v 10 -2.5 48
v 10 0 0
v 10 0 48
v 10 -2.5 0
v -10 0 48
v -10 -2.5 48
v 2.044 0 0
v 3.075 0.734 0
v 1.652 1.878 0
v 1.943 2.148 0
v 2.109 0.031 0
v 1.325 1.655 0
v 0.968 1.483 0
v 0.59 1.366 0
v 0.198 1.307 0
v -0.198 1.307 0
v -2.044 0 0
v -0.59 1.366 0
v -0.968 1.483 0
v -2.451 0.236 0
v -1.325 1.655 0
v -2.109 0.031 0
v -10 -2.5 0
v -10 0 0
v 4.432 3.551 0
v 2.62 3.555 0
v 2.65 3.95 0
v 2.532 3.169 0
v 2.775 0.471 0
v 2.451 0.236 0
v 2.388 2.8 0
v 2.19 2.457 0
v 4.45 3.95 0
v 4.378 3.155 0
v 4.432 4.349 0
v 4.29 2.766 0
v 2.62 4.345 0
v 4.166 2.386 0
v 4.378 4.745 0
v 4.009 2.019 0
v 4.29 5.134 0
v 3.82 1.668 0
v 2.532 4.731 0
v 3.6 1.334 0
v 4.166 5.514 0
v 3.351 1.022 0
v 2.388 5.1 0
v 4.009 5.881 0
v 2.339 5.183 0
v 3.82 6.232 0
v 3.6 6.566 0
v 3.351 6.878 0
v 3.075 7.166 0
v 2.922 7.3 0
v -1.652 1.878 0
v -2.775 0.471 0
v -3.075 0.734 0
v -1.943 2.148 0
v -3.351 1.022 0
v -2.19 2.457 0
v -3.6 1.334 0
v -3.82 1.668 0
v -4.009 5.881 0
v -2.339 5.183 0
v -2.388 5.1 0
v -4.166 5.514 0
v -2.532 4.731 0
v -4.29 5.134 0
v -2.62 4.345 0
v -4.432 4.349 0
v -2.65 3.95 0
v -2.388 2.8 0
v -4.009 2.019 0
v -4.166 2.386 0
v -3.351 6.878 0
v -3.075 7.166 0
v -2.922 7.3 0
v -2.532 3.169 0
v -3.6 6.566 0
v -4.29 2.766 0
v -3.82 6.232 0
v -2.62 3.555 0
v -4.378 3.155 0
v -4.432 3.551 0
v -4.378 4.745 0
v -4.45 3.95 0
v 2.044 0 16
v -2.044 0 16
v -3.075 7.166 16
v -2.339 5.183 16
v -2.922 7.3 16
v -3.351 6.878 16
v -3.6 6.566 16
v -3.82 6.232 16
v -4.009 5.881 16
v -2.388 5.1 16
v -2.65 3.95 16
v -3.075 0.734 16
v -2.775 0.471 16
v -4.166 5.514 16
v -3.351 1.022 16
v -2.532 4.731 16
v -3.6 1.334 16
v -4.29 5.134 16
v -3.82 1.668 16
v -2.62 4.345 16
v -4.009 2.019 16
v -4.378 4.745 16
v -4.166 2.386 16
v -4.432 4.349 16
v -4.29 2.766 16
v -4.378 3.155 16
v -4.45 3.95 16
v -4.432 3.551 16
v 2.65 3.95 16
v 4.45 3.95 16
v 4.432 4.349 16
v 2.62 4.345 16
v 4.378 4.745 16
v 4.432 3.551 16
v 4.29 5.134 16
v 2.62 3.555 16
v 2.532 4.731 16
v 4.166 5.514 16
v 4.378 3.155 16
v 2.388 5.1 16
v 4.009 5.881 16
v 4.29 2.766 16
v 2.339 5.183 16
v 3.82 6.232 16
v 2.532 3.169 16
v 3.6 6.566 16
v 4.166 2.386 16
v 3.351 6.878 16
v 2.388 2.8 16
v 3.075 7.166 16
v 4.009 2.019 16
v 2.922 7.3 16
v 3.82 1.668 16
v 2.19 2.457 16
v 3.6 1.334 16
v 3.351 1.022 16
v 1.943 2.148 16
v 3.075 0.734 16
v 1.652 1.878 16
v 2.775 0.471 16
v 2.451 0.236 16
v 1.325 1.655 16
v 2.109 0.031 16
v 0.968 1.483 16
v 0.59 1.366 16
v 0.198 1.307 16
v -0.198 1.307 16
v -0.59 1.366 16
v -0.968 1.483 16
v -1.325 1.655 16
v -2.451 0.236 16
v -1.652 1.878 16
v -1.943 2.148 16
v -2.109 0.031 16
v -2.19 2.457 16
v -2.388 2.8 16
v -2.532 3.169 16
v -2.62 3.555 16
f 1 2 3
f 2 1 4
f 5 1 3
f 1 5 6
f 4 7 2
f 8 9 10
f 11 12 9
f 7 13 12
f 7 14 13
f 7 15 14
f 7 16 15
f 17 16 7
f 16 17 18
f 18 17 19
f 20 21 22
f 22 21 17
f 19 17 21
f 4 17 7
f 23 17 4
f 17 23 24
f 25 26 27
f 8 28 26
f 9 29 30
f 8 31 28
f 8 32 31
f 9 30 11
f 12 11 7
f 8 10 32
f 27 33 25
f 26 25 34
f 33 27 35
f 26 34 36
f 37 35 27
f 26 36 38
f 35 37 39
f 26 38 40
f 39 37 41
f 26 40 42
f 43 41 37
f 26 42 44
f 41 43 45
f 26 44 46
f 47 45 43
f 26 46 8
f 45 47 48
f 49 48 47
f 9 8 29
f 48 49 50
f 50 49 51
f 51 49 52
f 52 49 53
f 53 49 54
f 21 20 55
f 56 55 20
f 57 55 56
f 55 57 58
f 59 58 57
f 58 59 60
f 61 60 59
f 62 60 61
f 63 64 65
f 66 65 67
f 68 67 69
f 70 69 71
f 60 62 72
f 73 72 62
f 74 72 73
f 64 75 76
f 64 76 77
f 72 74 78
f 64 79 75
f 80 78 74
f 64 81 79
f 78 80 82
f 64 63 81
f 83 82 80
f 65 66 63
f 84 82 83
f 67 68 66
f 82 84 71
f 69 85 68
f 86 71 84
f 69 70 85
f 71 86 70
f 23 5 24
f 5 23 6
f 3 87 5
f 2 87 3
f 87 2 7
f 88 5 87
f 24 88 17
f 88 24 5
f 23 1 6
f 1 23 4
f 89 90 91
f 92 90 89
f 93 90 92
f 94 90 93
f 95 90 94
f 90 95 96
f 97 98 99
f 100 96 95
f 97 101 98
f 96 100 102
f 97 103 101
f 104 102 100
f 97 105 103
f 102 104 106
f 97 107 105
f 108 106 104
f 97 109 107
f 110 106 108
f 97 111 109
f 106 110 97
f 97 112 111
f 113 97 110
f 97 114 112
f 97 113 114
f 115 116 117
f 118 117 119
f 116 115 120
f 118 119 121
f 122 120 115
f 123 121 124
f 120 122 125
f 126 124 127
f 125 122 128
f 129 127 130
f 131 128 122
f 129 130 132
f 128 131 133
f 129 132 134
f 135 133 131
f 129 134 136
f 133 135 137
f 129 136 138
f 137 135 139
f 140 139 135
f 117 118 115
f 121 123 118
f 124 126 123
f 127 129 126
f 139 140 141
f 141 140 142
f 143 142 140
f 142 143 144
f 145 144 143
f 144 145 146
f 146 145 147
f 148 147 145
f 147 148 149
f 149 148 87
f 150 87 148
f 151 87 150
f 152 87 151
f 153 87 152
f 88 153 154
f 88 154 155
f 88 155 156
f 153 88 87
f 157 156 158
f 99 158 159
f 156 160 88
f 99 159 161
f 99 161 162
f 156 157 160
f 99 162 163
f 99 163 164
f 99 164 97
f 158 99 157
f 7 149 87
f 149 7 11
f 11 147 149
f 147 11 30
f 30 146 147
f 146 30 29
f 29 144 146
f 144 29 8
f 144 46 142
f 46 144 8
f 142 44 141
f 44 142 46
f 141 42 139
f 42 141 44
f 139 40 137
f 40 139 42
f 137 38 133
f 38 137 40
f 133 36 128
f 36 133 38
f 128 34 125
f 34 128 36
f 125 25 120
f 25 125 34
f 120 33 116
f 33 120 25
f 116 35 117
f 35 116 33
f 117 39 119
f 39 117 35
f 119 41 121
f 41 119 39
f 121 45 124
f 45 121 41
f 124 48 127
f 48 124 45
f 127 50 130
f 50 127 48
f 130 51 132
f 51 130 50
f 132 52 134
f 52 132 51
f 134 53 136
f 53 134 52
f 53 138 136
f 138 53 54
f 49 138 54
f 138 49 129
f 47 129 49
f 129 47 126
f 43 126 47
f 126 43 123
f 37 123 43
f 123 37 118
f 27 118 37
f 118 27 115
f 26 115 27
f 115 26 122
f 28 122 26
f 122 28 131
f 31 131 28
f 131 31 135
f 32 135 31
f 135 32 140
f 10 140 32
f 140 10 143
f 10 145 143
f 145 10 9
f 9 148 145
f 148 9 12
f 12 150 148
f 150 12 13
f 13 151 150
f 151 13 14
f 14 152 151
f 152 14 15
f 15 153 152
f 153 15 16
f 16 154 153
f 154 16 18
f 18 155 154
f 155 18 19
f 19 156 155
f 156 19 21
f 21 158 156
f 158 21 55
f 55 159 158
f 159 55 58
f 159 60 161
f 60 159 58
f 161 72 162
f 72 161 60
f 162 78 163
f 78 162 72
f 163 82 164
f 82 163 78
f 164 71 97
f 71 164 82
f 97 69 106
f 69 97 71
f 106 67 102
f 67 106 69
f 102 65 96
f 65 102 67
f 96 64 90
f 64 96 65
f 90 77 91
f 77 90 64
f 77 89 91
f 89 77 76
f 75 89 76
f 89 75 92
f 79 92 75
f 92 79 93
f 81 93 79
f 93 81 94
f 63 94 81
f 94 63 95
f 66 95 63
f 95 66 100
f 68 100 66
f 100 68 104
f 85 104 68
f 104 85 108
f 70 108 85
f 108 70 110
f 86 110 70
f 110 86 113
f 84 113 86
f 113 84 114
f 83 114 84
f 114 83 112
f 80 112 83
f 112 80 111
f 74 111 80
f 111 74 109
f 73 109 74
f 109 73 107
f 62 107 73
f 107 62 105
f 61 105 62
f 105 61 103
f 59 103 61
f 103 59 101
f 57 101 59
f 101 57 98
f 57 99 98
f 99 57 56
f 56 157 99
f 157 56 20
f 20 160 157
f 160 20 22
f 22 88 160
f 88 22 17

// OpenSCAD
/* =====================================================
   Coax cable clip
   =====================================================
   A snap-in clip for the coax hanging off the ClearStream
   Flex antenna. Stick it to the wall a few inches below the
   antenna, so the cable's weight hangs on the clip and doesn't
   peel the antenna's bottom edge off the wall.

   Cable (measured): Ø5

   The clip opens away from the wall with a flared mouth a bit
   narrower than the cable. Push the cable in and the ring
   flexes and snaps round it. The plate takes a small Command
   strip (16 x 46).

   Print it standing on end, with the ring's cross-section on
   the bed. The whole part is a straight extrusion, so there's
   nothing to overhang.

   Coordinates: X across (centred), Y out from the wall (plate
   front face at Y = 0), Z along the cable.
   ===================================================== */

$fa = 2;
$fs = 0.4;

/* ── Cable (measured) ───────────────────────────────── */
cable_d = 5;

/* ── Clip ───────────────────────────────────────────── */
clear   = 0.15;  // per side inside the ring
ring_t  = 1.8;   // ring wall
mouth   = 4.0;   // opening, narrower than the cable so it snaps
flare   = 1.5;   // lead-in each side at the outer edge
clip_l  = 16;    // ring length along the cable
plate_w = 20;
plate_l = 48;    // fits a small Command strip
plate_t = 2.5;

/* ── Derived ────────────────────────────────────────── */
ri = cable_d / 2 + clear;
ro = ri + ring_t;
cy = ro - 0.5;   // ring centre; the ring sinks 0.5 into the plate

assert(mouth < cable_d, "mouth must be narrower than the cable to snap");

module ring_2d() {
    difference() {
        translate([0, cy]) circle(r = ro);
        translate([0, cy]) circle(r = ri);
        // mouth, flaring out toward the open side
        polygon([[-mouth / 2, cy], [mouth / 2, cy],
                 [mouth / 2 + flare, cy + ro + 1], [-mouth / 2 - flare, cy + ro + 1]]);
    }
}

module clip() {
    translate([-plate_w / 2, -plate_t, 0]) cube([plate_w, plate_t, plate_l]);
    linear_extrude(clip_l) ring_2d();
}

clip();
